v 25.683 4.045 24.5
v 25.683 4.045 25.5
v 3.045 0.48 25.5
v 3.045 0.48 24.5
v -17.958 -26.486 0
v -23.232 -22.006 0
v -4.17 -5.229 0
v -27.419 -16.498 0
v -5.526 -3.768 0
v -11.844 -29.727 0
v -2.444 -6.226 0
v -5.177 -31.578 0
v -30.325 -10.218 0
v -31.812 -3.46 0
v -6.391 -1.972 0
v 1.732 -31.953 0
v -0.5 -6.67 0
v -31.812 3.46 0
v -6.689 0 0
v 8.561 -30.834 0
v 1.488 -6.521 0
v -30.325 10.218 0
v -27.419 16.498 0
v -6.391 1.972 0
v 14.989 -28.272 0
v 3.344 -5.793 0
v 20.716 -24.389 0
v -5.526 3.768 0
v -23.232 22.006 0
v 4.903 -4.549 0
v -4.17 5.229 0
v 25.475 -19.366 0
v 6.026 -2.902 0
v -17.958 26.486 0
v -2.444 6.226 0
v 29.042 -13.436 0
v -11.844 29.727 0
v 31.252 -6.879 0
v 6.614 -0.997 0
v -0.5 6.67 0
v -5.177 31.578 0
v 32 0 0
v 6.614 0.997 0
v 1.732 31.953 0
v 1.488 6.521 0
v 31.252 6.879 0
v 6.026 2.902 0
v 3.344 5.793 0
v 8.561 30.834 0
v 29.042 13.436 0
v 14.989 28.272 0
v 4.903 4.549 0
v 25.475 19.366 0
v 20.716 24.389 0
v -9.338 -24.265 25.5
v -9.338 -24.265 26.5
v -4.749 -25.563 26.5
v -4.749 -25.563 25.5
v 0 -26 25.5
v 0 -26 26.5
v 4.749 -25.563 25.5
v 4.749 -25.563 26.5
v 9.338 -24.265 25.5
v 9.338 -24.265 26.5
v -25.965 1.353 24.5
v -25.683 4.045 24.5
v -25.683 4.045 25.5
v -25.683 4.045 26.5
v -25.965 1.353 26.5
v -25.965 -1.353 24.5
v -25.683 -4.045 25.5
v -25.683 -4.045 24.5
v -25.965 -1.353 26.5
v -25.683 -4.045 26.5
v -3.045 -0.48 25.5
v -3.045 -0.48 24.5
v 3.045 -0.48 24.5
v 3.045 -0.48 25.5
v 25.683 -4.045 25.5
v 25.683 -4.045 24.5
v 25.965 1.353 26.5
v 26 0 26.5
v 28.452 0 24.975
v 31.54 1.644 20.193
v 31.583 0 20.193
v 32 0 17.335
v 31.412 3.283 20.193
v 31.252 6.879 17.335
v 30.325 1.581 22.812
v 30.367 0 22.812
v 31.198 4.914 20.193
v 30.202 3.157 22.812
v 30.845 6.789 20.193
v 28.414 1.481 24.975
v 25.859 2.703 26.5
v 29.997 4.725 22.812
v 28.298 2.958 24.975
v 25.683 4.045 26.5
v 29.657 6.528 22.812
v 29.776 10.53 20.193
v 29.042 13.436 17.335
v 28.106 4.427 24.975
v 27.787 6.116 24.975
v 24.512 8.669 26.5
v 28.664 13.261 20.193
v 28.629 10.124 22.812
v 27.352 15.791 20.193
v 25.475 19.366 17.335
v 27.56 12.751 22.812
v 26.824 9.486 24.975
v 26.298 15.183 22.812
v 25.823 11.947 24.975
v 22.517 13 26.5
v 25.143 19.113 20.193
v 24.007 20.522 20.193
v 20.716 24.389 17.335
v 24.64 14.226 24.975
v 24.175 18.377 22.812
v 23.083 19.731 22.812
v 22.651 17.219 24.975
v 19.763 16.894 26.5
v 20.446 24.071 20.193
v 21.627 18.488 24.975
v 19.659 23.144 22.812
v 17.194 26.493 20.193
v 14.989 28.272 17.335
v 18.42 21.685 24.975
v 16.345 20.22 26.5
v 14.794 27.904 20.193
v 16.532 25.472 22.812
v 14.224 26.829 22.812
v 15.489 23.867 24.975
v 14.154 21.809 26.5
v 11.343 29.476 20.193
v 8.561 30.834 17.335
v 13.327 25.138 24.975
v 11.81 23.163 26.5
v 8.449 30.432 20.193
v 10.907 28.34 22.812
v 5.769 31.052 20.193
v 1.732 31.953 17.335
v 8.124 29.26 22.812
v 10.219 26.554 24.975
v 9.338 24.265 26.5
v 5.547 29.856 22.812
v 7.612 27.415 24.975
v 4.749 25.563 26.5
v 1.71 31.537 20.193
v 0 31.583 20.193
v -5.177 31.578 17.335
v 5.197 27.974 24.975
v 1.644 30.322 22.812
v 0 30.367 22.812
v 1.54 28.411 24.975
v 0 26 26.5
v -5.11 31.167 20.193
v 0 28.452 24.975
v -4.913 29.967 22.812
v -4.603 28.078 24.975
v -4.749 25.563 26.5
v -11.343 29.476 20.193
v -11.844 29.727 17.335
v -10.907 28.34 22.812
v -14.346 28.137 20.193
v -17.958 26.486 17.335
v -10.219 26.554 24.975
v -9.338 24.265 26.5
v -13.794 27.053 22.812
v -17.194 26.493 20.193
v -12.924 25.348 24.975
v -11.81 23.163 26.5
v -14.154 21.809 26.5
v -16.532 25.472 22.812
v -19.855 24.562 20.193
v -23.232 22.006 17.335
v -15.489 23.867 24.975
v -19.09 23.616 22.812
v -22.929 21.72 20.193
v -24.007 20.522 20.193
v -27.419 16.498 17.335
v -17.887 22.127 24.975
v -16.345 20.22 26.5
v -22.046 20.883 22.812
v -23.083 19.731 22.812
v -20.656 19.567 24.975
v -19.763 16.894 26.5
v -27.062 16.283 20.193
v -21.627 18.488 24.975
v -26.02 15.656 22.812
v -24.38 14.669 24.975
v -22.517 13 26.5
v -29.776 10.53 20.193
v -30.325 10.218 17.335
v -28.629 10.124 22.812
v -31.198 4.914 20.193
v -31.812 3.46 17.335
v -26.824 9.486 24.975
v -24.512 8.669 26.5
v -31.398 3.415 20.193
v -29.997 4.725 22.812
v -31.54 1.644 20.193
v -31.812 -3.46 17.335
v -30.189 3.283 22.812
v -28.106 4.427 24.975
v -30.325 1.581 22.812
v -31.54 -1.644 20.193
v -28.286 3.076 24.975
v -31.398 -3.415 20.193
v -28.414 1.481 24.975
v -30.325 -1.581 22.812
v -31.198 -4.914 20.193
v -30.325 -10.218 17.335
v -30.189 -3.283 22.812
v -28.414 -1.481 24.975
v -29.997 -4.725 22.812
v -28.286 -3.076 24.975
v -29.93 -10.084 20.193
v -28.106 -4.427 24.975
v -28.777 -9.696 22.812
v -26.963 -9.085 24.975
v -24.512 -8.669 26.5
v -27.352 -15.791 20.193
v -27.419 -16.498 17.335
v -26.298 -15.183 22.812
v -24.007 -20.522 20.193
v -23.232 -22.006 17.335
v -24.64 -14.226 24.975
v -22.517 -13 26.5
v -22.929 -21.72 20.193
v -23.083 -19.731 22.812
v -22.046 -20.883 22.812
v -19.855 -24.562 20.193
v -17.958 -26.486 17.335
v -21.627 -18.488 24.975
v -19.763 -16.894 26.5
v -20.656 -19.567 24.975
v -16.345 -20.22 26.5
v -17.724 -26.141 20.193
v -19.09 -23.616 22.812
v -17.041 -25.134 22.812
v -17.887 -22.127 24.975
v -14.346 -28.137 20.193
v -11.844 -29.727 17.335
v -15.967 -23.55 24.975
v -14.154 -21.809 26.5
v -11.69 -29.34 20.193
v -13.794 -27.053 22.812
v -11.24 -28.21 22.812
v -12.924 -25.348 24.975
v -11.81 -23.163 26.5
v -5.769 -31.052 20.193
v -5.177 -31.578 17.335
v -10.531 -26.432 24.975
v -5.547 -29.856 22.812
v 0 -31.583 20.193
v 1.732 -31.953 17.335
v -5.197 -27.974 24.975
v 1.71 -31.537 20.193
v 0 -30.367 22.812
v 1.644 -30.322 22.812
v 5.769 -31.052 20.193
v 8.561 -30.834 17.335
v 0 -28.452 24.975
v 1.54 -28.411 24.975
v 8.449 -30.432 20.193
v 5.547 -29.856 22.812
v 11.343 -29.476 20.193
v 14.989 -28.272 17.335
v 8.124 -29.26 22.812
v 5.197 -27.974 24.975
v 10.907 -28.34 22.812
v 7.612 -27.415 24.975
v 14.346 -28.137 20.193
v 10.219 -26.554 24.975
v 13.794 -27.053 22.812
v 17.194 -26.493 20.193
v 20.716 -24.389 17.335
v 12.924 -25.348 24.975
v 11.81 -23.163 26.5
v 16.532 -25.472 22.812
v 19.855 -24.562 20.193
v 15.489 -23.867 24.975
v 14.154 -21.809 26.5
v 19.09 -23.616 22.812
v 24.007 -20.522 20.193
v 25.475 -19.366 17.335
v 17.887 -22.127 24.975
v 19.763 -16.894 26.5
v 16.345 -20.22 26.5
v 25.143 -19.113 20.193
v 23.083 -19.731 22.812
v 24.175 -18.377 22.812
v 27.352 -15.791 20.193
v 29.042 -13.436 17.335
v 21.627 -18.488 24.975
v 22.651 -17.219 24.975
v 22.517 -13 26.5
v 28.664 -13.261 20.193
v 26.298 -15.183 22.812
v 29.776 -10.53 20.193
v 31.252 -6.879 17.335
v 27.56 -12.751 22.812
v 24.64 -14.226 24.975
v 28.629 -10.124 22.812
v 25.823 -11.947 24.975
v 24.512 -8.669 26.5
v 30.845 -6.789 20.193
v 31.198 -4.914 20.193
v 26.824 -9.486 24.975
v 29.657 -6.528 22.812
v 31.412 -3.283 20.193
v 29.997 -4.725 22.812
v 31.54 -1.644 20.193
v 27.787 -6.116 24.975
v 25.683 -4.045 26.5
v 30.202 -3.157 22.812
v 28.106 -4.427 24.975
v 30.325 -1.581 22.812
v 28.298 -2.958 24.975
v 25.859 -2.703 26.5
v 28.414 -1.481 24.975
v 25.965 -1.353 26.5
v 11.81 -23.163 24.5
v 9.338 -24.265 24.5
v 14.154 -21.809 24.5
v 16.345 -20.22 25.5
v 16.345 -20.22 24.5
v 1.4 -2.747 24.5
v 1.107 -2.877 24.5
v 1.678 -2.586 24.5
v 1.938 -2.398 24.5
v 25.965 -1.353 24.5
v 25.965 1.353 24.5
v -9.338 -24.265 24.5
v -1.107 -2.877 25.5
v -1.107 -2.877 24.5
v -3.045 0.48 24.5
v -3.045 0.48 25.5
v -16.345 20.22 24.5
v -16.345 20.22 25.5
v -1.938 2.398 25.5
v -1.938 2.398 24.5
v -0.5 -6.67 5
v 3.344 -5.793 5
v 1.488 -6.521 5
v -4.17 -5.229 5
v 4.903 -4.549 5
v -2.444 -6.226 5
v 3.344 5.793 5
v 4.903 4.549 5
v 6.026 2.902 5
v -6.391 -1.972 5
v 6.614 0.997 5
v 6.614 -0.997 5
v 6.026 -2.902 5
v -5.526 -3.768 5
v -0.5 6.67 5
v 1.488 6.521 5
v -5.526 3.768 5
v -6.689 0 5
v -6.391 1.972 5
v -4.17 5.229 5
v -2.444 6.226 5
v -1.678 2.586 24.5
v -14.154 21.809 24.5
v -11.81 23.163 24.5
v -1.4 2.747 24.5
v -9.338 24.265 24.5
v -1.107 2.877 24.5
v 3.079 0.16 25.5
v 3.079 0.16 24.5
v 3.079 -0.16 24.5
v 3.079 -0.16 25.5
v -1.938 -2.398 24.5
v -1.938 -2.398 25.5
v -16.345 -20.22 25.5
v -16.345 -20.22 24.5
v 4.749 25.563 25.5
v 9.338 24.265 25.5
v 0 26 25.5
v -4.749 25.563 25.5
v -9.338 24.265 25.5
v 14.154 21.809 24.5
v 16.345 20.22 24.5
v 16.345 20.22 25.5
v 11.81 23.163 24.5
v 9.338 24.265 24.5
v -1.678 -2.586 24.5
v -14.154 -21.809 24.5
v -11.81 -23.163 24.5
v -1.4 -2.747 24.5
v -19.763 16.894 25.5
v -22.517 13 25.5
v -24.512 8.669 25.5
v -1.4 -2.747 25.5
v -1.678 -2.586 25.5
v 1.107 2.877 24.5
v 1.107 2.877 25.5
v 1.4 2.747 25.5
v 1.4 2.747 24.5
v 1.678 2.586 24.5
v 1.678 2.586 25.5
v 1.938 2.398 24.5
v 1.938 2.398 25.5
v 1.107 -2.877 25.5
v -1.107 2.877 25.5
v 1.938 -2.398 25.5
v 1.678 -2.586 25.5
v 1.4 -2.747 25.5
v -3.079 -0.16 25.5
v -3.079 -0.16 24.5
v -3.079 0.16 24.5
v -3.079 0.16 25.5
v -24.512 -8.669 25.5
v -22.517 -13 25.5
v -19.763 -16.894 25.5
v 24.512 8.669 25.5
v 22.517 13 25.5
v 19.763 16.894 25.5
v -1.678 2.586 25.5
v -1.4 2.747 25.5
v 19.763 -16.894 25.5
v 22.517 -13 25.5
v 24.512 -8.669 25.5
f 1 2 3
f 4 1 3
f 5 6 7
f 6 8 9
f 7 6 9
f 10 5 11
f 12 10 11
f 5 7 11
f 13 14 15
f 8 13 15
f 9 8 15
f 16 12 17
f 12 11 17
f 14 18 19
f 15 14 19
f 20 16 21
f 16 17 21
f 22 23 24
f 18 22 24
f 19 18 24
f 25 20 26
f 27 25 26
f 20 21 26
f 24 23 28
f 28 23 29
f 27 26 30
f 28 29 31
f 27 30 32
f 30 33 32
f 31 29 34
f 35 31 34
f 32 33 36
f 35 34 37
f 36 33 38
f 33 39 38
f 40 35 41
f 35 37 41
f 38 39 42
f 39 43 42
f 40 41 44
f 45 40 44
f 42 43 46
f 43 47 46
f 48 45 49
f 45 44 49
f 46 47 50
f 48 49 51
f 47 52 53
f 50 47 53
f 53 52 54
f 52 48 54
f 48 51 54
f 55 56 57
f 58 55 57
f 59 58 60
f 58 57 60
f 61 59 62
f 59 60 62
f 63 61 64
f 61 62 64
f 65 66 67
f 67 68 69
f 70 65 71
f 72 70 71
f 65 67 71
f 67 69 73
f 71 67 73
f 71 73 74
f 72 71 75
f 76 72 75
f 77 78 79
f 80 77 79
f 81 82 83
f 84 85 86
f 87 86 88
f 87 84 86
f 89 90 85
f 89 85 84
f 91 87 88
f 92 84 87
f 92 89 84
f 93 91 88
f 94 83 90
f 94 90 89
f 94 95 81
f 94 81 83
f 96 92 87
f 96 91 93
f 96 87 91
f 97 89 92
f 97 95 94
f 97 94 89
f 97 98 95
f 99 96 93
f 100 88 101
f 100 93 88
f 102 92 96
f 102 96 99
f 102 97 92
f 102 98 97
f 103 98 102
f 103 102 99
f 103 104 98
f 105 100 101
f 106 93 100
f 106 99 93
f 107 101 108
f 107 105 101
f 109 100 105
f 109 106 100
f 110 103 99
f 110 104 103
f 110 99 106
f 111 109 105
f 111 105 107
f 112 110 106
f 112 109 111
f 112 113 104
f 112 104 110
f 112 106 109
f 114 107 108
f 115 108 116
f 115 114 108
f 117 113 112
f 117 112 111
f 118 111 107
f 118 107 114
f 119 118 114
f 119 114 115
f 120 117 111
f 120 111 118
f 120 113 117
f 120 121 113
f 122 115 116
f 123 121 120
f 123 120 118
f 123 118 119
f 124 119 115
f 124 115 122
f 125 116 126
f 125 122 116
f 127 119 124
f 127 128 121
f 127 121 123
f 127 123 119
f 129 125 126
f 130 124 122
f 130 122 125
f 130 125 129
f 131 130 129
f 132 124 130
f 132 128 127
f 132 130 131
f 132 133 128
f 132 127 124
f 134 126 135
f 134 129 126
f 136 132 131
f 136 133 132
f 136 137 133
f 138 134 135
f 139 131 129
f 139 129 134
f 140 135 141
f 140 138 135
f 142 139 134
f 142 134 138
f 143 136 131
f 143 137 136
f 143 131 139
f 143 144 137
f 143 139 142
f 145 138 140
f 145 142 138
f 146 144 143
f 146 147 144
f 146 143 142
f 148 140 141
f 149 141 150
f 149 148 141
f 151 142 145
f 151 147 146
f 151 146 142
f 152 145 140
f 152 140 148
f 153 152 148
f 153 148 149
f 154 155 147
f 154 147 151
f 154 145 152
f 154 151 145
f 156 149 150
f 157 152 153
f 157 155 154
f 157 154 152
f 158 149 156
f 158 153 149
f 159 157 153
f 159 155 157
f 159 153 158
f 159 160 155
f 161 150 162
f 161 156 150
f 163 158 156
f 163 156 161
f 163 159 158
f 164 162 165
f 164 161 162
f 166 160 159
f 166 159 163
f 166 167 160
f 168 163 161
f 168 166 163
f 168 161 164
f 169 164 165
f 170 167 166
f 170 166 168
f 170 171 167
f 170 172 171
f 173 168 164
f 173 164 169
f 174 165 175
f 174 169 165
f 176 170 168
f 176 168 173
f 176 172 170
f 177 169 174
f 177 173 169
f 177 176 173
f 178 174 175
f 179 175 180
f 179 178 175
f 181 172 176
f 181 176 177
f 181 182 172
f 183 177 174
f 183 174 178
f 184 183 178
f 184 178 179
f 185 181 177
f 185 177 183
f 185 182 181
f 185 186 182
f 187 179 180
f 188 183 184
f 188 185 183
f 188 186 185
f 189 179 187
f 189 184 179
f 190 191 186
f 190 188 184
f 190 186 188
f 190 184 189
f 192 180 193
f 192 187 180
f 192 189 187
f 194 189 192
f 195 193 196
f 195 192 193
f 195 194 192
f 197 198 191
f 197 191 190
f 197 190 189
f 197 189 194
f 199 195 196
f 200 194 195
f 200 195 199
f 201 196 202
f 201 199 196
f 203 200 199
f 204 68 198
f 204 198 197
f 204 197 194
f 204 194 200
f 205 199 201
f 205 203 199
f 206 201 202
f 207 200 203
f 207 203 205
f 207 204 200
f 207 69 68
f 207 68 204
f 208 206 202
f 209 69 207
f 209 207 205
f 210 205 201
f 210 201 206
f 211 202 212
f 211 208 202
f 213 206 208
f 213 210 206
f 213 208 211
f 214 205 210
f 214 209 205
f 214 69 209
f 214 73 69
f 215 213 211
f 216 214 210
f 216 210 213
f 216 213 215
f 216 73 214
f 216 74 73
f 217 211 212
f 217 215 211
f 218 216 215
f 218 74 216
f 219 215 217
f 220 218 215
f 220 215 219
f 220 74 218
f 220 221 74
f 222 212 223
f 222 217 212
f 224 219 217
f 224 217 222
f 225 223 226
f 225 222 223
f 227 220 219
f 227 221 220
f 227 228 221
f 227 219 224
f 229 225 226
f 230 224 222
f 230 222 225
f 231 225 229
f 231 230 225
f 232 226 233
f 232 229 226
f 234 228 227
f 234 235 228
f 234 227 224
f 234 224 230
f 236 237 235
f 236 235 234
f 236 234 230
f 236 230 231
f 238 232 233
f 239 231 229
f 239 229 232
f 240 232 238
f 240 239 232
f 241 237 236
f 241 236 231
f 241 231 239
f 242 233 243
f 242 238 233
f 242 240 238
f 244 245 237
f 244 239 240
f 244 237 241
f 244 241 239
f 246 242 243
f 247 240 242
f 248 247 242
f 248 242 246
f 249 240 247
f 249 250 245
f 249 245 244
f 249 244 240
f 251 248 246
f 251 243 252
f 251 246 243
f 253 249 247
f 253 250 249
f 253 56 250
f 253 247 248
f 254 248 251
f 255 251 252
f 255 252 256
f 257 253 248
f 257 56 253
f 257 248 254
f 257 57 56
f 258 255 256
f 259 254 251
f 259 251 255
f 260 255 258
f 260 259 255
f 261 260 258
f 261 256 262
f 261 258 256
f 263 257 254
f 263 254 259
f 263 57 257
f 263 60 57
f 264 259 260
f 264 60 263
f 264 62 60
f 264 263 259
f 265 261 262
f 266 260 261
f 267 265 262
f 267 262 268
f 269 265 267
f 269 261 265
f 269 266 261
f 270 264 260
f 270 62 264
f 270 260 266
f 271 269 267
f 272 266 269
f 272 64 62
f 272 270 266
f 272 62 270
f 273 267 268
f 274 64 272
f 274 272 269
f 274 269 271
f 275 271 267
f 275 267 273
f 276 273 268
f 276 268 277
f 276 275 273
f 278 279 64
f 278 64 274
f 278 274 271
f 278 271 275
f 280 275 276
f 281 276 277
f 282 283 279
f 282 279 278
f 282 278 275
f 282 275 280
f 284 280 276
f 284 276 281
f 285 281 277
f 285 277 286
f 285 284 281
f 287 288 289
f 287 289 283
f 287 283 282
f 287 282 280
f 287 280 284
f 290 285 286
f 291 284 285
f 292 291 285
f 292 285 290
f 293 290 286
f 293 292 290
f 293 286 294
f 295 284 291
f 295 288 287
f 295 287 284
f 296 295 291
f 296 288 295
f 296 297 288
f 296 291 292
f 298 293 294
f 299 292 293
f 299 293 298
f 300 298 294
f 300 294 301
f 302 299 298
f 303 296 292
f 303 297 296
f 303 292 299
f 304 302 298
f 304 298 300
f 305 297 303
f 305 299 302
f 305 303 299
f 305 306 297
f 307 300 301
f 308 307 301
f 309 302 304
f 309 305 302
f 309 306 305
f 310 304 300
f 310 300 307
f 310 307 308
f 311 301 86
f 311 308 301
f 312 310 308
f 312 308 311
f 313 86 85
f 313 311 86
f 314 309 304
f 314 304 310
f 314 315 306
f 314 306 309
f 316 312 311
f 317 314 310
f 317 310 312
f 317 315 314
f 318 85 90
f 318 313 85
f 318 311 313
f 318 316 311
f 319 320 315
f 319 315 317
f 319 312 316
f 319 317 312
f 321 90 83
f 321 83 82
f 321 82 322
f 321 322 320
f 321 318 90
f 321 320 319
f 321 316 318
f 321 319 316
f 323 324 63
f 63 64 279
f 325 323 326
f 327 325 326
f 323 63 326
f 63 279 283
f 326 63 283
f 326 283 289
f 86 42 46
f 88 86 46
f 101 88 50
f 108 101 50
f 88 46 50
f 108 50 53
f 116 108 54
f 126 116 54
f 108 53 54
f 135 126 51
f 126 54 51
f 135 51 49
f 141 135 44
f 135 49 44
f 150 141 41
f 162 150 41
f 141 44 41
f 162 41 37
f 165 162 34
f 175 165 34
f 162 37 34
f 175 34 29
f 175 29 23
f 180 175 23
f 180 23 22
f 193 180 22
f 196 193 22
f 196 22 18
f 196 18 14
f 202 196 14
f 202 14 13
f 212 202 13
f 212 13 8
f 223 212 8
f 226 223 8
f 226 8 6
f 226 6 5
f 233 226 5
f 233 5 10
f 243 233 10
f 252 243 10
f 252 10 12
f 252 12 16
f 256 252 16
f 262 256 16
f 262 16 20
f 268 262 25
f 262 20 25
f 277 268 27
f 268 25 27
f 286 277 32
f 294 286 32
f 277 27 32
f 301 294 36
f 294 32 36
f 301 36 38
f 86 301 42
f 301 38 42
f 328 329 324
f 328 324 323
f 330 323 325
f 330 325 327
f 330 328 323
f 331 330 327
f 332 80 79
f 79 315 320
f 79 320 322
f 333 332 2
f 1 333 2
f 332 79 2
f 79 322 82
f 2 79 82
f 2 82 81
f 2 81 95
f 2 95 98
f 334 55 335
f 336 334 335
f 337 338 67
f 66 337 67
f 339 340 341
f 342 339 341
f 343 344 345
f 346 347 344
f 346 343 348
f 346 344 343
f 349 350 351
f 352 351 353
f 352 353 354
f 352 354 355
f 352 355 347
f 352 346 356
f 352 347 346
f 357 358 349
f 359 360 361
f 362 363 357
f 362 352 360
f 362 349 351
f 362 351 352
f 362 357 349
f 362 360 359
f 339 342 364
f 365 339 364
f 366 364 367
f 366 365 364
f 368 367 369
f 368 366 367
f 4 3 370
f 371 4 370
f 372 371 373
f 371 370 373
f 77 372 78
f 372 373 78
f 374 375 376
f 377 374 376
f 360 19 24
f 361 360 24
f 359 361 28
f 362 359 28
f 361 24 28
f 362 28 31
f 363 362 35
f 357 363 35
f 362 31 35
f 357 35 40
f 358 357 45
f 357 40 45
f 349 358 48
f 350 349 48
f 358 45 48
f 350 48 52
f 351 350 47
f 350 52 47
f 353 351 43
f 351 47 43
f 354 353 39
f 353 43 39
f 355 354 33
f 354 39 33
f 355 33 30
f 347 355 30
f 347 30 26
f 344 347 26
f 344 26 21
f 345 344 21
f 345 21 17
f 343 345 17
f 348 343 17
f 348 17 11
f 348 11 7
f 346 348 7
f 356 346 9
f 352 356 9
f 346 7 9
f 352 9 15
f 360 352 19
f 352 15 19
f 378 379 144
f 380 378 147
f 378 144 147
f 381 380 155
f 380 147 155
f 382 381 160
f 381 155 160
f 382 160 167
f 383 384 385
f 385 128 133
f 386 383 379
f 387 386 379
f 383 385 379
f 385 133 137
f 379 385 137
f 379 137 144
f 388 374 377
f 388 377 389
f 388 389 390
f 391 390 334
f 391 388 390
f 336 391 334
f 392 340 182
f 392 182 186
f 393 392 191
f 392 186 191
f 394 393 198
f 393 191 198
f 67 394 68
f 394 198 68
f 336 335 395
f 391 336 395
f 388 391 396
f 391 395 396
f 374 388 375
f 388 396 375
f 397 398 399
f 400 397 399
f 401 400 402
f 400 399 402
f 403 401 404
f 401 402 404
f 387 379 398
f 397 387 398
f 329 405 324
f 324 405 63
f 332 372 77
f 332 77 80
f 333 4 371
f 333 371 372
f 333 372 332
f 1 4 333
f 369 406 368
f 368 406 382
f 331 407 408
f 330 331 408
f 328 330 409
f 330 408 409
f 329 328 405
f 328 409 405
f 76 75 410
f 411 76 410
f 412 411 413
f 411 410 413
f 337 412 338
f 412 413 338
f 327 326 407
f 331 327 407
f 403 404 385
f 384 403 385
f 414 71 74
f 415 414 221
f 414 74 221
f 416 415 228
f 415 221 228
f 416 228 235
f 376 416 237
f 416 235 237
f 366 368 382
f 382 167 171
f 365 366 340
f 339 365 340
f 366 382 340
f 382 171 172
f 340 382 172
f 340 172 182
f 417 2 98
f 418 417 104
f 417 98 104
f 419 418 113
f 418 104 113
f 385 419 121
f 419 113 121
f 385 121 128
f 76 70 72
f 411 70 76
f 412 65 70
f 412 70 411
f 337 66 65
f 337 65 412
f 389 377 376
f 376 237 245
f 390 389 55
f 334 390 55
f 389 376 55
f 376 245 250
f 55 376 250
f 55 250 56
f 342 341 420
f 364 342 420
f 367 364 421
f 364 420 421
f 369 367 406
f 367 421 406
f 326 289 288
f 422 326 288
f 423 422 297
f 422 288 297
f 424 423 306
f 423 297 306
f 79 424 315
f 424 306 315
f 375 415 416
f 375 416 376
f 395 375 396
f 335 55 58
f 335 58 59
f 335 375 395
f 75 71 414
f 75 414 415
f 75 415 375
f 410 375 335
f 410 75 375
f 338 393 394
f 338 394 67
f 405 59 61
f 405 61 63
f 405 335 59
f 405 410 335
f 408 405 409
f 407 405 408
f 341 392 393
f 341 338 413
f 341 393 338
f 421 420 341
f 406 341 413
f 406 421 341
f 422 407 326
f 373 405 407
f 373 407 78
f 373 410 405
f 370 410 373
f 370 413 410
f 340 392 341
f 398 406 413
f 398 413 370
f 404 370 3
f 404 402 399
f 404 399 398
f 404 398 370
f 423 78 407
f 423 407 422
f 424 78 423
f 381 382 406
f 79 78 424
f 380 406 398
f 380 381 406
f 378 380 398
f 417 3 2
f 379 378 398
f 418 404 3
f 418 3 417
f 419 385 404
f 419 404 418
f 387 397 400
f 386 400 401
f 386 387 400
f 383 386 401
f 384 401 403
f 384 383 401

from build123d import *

# Parameters (mm, degrees)
SKETCH_1_R          = 32
EXTRUDE_1_DEPTH     = 26.5
CUT_EXTRUDE_4_DEPTH = 2
SKETCH_3_R          = 26
CUT_EXTRUDE_5_DEPTH = 1
FILLET_1_R          = 10
SKETCH_4_R          = 6.68863581
CUT_EXTRUDE_6_DEPTH = 5


with BuildPart() as part:
    # 草图1 → 凸台-拉伸1 (new body)
    with BuildSketch(Plane.XY):
        Circle(SKETCH_1_R)
    extrude(amount=EXTRUDE_1_DEPTH)

    # 草图2 → 切除-拉伸4 (cut)
    with BuildSketch(Plane.XY.offset(26.5)):
        with BuildLine():
            ThreePointArc((3.045475662, 0.479690306), (3.083022023, 0), (3.045475662, -0.479690306))
            Line((3.045475662, -0.479690306), (25.683360874, -4.045364533))
            ThreePointArc((25.683360874, -4.045364533), (26, 0), (25.683360874, 4.045364533))
            Line((25.683360874, 4.045364533), (3.045475662, 0.479690306))
        make_face()
        with BuildLine():
            Line((16.34506889, -20.219760705), (1.938161822, -2.397614137))
            ThreePointArc((1.938161822, -2.397614137), (1.541511012, -2.669975393), (1.10731384, -2.877304443))
            Line((1.10731384, -2.877304443), (9.338291984, -24.265125238))
            ThreePointArc((9.338291984, -24.265125238), (13, -22.516660498), (16.34506889, -20.219760705))
        make_face()
        with BuildLine():
            Line((-9.338291984, -24.265125238), (-1.10731384, -2.877304443))
            ThreePointArc((-1.10731384, -2.877304443), (-1.541511012, -2.669975393), (-1.938161822, -2.397614137))
            Line((-1.938161822, -2.397614137), (-16.34506889, -20.219760705))
            ThreePointArc((-16.34506889, -20.219760705), (-13, -22.516660498), (-9.338291984, -24.265125238))
        make_face()
        with BuildLine():
            Line((-25.683360874, -4.045364533), (-3.045475662, -0.479690306))
            ThreePointArc((-3.045475662, -0.479690306), (-3.083022023, 0), (-3.045475662, 0.479690306))
            Line((-3.045475662, 0.479690306), (-25.683360874, 4.045364533))
            ThreePointArc((-25.683360874, 4.045364533), (-26, 0), (-25.683360874, -4.045364533))
        make_face()
        with BuildLine():
            Line((-16.34506889, 20.219760705), (-1.938161822, 2.397614137))
            ThreePointArc((-1.938161822, 2.397614137), (-1.541511012, 2.669975393), (-1.10731384, 2.877304443))
            Line((-1.10731384, 2.877304443), (-9.338291984, 24.265125238))
            ThreePointArc((-9.338291984, 24.265125238), (-13, 22.516660498), (-16.34506889, 20.219760705))
        make_face()
        with BuildLine():
            Line((9.338291984, 24.265125238), (1.10731384, 2.877304443))
            ThreePointArc((1.10731384, 2.877304443), (1.541511012, 2.669975393), (1.938161822, 2.397614137))
            Line((1.938161822, 2.397614137), (16.34506889, 20.219760705))
            ThreePointArc((16.34506889, 20.219760705), (13, 22.516660498), (9.338291984, 24.265125238))
        make_face()
    extrude(amount=-CUT_EXTRUDE_4_DEPTH, mode=Mode.SUBTRACT)

    # 草图3 → 切除-拉伸5 (cut)
    with BuildSketch(Plane.XY.offset(26.5)):
        Circle(SKETCH_3_R)
    extrude(amount=-CUT_EXTRUDE_5_DEPTH, mode=Mode.SUBTRACT)

    # 圆角1
    # the kernel refuses this fillet: 10 mm, written as the material it takes off along each edge
    with BuildSketch(Plane(origin=(0, 0, 26.5), x_dir=(1, 0, 0), z_dir=(0, -1, 0))) as fillet_1_piece_1:
        with BuildLine():
            CenterArc((22, -9.16515139), FILLET_1_R, 0, 66.421821522)
            Line((26, 0), (26.08, 0.183303028))
            ThreePointArc((26.08, 0.183303028), (29, 0.2), (32, 0.2))
            Line((32, 0.2), (32.2, 0))
            Line((32.2, 0), (32.2, -9.16515139))
            Line((32.2, -9.16515139), (32, -9.16515139))
        make_face()
    revolve(axis=Axis((0, 0, 26.5), (0, 0, 1)), mode=Mode.SUBTRACT)

    # 草图4 → 切除-拉伸6 (cut)
    with BuildSketch(Plane(origin=(0, 0, 0), x_dir=(-1, 0, 0), z_dir=(0, 0, -1))):
        Circle(SKETCH_4_R)
    extrude(amount=-CUT_EXTRUDE_6_DEPTH, mode=Mode.SUBTRACT)


solid = part.part
